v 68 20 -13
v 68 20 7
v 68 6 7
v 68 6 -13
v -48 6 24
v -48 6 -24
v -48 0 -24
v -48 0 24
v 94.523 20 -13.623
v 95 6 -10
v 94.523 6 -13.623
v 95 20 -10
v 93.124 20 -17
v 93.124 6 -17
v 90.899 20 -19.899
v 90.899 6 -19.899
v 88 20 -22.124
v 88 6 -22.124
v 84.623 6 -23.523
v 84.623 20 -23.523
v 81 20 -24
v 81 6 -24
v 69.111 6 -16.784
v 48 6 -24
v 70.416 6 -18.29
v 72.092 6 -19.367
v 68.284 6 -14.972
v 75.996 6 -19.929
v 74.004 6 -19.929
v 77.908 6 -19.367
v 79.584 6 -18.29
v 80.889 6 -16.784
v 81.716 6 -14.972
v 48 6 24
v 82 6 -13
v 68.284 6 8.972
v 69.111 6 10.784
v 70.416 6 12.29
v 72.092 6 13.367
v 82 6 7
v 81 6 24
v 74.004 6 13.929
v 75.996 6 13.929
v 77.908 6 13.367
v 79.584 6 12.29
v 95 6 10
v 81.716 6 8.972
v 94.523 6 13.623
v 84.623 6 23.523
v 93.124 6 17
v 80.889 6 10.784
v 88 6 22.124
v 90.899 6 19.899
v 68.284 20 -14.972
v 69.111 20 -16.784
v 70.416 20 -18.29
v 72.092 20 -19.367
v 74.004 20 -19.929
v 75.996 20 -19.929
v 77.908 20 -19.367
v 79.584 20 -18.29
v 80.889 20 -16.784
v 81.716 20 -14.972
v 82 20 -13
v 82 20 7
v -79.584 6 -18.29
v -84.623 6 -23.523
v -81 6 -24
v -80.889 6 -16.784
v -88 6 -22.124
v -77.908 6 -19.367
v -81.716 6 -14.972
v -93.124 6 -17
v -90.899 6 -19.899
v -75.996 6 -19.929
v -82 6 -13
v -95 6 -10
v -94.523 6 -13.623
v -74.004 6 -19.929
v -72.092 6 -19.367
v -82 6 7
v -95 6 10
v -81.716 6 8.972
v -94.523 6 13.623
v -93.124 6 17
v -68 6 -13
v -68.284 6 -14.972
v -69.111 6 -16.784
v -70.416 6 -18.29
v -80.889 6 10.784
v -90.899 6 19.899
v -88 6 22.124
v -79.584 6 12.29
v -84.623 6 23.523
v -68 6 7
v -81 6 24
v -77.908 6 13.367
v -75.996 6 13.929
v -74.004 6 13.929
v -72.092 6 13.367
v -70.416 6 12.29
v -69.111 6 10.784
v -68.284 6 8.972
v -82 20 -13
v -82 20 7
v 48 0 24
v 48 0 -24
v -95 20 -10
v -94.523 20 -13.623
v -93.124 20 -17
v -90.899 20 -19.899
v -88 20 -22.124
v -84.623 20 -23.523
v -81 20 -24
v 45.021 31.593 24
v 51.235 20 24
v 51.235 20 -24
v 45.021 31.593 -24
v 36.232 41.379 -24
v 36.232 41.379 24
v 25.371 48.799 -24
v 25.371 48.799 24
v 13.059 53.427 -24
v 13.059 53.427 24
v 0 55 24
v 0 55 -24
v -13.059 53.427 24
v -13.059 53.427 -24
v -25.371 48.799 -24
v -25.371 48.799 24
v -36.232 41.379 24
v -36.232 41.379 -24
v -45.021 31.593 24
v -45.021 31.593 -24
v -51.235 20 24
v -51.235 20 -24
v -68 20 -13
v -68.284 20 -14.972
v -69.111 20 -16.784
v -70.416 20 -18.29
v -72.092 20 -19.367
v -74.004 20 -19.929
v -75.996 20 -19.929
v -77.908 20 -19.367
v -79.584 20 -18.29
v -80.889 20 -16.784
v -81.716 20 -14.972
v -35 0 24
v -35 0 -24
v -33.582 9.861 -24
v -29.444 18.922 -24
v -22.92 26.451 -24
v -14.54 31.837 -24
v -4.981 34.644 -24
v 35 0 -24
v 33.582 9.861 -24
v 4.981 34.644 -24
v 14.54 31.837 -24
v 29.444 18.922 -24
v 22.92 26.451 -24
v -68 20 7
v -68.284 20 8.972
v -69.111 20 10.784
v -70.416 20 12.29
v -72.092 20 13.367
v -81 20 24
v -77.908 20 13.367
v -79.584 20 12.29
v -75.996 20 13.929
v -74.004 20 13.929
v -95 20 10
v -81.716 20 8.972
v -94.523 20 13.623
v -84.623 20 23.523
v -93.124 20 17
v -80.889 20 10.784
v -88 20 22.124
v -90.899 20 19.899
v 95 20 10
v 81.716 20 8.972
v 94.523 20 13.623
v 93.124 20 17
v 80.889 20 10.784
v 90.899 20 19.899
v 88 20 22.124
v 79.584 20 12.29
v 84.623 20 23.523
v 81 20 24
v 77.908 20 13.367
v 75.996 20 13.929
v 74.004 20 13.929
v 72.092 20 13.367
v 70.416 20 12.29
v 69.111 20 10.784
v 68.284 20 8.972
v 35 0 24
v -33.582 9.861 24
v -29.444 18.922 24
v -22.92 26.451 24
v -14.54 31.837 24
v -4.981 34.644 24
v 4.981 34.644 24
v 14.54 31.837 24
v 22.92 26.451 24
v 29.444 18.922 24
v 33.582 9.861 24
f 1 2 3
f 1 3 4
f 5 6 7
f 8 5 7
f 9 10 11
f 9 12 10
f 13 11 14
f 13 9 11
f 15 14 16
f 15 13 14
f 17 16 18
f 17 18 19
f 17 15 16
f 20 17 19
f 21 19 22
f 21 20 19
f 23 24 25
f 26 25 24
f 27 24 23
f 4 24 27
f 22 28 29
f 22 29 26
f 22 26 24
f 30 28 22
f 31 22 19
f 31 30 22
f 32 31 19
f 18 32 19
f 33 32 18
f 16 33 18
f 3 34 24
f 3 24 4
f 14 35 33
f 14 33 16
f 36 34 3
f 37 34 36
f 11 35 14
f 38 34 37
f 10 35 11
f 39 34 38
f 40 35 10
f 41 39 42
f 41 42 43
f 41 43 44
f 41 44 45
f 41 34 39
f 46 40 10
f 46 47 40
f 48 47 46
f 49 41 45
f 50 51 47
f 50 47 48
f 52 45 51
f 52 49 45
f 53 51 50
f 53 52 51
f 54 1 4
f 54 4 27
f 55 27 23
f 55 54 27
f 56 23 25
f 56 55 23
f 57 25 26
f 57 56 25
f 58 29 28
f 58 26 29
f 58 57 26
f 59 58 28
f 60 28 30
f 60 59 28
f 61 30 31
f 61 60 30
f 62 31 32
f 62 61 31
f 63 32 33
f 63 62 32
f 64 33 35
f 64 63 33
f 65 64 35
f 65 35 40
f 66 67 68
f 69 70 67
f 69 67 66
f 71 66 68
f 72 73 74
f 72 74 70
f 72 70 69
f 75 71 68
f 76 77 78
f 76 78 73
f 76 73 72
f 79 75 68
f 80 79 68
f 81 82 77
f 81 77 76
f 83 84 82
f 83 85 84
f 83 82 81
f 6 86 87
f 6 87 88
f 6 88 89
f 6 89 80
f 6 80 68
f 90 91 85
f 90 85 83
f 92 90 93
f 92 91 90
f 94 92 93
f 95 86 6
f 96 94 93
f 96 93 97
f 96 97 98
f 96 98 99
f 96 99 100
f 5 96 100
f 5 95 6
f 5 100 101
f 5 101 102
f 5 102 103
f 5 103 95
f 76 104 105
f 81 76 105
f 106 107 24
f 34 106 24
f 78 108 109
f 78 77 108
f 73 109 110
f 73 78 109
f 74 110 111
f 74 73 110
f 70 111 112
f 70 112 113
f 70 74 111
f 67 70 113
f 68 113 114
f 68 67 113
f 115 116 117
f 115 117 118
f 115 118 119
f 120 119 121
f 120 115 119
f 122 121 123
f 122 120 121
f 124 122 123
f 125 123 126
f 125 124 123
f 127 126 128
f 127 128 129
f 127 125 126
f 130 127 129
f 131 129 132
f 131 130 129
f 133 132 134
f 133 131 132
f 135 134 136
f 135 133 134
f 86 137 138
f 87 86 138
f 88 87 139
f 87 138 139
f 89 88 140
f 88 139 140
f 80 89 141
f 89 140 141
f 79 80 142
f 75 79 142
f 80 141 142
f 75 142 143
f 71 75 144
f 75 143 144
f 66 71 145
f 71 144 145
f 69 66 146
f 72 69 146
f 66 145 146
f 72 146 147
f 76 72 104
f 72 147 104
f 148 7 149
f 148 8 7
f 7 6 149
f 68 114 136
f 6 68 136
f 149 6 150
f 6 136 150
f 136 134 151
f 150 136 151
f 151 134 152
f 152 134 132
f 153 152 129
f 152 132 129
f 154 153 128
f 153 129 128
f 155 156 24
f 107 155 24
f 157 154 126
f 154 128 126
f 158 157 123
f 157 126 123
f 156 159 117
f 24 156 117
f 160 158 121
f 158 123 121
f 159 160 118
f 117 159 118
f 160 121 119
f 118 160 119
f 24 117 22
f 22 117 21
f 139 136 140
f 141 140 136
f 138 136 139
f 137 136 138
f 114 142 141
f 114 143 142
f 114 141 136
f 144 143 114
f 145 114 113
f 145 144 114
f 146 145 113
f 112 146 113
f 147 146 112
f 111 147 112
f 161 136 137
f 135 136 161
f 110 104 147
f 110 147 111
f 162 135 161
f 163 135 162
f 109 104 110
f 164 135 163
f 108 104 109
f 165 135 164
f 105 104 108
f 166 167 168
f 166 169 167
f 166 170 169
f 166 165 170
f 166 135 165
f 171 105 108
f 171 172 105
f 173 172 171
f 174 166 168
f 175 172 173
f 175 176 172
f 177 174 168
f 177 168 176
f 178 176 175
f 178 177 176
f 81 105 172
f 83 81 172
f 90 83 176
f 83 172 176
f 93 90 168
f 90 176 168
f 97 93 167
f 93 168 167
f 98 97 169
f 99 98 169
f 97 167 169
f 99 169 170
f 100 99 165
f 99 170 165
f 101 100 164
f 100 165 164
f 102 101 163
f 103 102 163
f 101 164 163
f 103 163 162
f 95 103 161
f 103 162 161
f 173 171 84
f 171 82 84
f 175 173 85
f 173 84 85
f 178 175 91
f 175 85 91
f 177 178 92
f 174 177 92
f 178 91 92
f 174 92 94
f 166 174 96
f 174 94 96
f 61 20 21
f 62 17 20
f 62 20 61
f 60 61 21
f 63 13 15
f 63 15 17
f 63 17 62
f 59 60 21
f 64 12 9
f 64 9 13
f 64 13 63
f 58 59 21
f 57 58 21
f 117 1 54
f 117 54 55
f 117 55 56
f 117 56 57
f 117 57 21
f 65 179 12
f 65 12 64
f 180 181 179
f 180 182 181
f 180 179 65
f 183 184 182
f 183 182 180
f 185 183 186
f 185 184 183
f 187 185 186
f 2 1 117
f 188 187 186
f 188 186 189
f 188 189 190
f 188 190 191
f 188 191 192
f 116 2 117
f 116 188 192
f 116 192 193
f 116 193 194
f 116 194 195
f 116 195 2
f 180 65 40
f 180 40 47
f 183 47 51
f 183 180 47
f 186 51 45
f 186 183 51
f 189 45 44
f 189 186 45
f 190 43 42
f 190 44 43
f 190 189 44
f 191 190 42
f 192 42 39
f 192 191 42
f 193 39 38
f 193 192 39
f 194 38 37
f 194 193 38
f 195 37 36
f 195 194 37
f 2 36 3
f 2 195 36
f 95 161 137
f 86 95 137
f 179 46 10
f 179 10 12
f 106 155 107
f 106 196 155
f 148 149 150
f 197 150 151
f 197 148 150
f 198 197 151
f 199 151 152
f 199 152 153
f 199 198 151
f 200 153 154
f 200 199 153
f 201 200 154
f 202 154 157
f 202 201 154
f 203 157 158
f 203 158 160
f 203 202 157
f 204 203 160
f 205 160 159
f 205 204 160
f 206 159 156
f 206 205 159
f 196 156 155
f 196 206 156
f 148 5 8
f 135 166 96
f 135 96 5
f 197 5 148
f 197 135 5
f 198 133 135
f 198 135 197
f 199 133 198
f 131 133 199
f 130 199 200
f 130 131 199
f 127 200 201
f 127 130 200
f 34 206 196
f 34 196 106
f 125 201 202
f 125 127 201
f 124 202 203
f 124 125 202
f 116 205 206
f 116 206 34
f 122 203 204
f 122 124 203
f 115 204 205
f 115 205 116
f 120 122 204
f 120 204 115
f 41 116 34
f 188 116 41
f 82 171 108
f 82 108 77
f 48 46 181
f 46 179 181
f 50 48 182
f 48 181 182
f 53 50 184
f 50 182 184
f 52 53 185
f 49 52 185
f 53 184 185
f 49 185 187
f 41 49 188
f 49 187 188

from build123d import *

# Parameters (mm, degrees)
BOSS_EXTRUDE1_DEPTH     = 24
FILLET1_R               = 14
CUT_EXTRUDE1_DEPTH      = 36
CUT_EXTRUDE1_DEPTH_BACK = 21


with BuildPart() as part:
    # Sketch1 → Boss-Extrude1 (new body, symmetric)
    with BuildSketch(Plane.XY):
        with BuildLine():
            Line((35, 0), (48, 0))
            Line((48, 0), (48, 6))
            Line((48, 6), (95, 6))
            Line((95, 6), (95, 20))
            Line((95, 20), (51.23475383, 20))
            ThreePointArc((51.23475383, 20), (0, 55), (-51.23475383, 20))
            Line((-51.23475383, 20), (-95, 20))
            Line((-95, 20), (-95, 6))
            Line((-95, 6), (-48, 6))
            Line((-48, 6), (-48, 0))
            Line((-48, 0), (-35, 0))
            ThreePointArc((-35, 0), (0, 35), (35, 0))
        make_face()
    extrude(amount=BOSS_EXTRUDE1_DEPTH, both=True)

    # Fillet1
    fillet1_edges = [part.edges().sort_by_distance(p)[0] for p in [
        (95, 13, -24),
        (-95, 13, -24),
        (95, 13, 24),
        (-95, 13, 24),
    ]]
    fillet(fillet1_edges, radius=FILLET1_R)

    # Sketch2 → Cut-Extrude1 (cut, two sides)
    with BuildSketch(Plane(origin=(0, 20, 0), x_dir=(1, 0, 0), z_dir=(0, 1, 0))) as cut_extrude1_sk:
        with BuildLine():
            Line((68, -7), (68, 13))
            ThreePointArc((68, 13), (75, 20), (82, 13))
            Line((82, 13), (82, -7))
            ThreePointArc((82, -7), (75, -14), (68, -7))
        make_face()
        with BuildLine():
            Line((-68, -7), (-68, 13))
            ThreePointArc((-68, 13), (-75, 20), (-82, 13))
            Line((-82, 13), (-82, -7))
            ThreePointArc((-82, -7), (-75, -14), (-68, -7))
        make_face()
    extrude(amount=CUT_EXTRUDE1_DEPTH, mode=Mode.SUBTRACT)
    extrude(cut_extrude1_sk.sketch, amount=-CUT_EXTRUDE1_DEPTH_BACK, mode=Mode.SUBTRACT)


solid = part.part
